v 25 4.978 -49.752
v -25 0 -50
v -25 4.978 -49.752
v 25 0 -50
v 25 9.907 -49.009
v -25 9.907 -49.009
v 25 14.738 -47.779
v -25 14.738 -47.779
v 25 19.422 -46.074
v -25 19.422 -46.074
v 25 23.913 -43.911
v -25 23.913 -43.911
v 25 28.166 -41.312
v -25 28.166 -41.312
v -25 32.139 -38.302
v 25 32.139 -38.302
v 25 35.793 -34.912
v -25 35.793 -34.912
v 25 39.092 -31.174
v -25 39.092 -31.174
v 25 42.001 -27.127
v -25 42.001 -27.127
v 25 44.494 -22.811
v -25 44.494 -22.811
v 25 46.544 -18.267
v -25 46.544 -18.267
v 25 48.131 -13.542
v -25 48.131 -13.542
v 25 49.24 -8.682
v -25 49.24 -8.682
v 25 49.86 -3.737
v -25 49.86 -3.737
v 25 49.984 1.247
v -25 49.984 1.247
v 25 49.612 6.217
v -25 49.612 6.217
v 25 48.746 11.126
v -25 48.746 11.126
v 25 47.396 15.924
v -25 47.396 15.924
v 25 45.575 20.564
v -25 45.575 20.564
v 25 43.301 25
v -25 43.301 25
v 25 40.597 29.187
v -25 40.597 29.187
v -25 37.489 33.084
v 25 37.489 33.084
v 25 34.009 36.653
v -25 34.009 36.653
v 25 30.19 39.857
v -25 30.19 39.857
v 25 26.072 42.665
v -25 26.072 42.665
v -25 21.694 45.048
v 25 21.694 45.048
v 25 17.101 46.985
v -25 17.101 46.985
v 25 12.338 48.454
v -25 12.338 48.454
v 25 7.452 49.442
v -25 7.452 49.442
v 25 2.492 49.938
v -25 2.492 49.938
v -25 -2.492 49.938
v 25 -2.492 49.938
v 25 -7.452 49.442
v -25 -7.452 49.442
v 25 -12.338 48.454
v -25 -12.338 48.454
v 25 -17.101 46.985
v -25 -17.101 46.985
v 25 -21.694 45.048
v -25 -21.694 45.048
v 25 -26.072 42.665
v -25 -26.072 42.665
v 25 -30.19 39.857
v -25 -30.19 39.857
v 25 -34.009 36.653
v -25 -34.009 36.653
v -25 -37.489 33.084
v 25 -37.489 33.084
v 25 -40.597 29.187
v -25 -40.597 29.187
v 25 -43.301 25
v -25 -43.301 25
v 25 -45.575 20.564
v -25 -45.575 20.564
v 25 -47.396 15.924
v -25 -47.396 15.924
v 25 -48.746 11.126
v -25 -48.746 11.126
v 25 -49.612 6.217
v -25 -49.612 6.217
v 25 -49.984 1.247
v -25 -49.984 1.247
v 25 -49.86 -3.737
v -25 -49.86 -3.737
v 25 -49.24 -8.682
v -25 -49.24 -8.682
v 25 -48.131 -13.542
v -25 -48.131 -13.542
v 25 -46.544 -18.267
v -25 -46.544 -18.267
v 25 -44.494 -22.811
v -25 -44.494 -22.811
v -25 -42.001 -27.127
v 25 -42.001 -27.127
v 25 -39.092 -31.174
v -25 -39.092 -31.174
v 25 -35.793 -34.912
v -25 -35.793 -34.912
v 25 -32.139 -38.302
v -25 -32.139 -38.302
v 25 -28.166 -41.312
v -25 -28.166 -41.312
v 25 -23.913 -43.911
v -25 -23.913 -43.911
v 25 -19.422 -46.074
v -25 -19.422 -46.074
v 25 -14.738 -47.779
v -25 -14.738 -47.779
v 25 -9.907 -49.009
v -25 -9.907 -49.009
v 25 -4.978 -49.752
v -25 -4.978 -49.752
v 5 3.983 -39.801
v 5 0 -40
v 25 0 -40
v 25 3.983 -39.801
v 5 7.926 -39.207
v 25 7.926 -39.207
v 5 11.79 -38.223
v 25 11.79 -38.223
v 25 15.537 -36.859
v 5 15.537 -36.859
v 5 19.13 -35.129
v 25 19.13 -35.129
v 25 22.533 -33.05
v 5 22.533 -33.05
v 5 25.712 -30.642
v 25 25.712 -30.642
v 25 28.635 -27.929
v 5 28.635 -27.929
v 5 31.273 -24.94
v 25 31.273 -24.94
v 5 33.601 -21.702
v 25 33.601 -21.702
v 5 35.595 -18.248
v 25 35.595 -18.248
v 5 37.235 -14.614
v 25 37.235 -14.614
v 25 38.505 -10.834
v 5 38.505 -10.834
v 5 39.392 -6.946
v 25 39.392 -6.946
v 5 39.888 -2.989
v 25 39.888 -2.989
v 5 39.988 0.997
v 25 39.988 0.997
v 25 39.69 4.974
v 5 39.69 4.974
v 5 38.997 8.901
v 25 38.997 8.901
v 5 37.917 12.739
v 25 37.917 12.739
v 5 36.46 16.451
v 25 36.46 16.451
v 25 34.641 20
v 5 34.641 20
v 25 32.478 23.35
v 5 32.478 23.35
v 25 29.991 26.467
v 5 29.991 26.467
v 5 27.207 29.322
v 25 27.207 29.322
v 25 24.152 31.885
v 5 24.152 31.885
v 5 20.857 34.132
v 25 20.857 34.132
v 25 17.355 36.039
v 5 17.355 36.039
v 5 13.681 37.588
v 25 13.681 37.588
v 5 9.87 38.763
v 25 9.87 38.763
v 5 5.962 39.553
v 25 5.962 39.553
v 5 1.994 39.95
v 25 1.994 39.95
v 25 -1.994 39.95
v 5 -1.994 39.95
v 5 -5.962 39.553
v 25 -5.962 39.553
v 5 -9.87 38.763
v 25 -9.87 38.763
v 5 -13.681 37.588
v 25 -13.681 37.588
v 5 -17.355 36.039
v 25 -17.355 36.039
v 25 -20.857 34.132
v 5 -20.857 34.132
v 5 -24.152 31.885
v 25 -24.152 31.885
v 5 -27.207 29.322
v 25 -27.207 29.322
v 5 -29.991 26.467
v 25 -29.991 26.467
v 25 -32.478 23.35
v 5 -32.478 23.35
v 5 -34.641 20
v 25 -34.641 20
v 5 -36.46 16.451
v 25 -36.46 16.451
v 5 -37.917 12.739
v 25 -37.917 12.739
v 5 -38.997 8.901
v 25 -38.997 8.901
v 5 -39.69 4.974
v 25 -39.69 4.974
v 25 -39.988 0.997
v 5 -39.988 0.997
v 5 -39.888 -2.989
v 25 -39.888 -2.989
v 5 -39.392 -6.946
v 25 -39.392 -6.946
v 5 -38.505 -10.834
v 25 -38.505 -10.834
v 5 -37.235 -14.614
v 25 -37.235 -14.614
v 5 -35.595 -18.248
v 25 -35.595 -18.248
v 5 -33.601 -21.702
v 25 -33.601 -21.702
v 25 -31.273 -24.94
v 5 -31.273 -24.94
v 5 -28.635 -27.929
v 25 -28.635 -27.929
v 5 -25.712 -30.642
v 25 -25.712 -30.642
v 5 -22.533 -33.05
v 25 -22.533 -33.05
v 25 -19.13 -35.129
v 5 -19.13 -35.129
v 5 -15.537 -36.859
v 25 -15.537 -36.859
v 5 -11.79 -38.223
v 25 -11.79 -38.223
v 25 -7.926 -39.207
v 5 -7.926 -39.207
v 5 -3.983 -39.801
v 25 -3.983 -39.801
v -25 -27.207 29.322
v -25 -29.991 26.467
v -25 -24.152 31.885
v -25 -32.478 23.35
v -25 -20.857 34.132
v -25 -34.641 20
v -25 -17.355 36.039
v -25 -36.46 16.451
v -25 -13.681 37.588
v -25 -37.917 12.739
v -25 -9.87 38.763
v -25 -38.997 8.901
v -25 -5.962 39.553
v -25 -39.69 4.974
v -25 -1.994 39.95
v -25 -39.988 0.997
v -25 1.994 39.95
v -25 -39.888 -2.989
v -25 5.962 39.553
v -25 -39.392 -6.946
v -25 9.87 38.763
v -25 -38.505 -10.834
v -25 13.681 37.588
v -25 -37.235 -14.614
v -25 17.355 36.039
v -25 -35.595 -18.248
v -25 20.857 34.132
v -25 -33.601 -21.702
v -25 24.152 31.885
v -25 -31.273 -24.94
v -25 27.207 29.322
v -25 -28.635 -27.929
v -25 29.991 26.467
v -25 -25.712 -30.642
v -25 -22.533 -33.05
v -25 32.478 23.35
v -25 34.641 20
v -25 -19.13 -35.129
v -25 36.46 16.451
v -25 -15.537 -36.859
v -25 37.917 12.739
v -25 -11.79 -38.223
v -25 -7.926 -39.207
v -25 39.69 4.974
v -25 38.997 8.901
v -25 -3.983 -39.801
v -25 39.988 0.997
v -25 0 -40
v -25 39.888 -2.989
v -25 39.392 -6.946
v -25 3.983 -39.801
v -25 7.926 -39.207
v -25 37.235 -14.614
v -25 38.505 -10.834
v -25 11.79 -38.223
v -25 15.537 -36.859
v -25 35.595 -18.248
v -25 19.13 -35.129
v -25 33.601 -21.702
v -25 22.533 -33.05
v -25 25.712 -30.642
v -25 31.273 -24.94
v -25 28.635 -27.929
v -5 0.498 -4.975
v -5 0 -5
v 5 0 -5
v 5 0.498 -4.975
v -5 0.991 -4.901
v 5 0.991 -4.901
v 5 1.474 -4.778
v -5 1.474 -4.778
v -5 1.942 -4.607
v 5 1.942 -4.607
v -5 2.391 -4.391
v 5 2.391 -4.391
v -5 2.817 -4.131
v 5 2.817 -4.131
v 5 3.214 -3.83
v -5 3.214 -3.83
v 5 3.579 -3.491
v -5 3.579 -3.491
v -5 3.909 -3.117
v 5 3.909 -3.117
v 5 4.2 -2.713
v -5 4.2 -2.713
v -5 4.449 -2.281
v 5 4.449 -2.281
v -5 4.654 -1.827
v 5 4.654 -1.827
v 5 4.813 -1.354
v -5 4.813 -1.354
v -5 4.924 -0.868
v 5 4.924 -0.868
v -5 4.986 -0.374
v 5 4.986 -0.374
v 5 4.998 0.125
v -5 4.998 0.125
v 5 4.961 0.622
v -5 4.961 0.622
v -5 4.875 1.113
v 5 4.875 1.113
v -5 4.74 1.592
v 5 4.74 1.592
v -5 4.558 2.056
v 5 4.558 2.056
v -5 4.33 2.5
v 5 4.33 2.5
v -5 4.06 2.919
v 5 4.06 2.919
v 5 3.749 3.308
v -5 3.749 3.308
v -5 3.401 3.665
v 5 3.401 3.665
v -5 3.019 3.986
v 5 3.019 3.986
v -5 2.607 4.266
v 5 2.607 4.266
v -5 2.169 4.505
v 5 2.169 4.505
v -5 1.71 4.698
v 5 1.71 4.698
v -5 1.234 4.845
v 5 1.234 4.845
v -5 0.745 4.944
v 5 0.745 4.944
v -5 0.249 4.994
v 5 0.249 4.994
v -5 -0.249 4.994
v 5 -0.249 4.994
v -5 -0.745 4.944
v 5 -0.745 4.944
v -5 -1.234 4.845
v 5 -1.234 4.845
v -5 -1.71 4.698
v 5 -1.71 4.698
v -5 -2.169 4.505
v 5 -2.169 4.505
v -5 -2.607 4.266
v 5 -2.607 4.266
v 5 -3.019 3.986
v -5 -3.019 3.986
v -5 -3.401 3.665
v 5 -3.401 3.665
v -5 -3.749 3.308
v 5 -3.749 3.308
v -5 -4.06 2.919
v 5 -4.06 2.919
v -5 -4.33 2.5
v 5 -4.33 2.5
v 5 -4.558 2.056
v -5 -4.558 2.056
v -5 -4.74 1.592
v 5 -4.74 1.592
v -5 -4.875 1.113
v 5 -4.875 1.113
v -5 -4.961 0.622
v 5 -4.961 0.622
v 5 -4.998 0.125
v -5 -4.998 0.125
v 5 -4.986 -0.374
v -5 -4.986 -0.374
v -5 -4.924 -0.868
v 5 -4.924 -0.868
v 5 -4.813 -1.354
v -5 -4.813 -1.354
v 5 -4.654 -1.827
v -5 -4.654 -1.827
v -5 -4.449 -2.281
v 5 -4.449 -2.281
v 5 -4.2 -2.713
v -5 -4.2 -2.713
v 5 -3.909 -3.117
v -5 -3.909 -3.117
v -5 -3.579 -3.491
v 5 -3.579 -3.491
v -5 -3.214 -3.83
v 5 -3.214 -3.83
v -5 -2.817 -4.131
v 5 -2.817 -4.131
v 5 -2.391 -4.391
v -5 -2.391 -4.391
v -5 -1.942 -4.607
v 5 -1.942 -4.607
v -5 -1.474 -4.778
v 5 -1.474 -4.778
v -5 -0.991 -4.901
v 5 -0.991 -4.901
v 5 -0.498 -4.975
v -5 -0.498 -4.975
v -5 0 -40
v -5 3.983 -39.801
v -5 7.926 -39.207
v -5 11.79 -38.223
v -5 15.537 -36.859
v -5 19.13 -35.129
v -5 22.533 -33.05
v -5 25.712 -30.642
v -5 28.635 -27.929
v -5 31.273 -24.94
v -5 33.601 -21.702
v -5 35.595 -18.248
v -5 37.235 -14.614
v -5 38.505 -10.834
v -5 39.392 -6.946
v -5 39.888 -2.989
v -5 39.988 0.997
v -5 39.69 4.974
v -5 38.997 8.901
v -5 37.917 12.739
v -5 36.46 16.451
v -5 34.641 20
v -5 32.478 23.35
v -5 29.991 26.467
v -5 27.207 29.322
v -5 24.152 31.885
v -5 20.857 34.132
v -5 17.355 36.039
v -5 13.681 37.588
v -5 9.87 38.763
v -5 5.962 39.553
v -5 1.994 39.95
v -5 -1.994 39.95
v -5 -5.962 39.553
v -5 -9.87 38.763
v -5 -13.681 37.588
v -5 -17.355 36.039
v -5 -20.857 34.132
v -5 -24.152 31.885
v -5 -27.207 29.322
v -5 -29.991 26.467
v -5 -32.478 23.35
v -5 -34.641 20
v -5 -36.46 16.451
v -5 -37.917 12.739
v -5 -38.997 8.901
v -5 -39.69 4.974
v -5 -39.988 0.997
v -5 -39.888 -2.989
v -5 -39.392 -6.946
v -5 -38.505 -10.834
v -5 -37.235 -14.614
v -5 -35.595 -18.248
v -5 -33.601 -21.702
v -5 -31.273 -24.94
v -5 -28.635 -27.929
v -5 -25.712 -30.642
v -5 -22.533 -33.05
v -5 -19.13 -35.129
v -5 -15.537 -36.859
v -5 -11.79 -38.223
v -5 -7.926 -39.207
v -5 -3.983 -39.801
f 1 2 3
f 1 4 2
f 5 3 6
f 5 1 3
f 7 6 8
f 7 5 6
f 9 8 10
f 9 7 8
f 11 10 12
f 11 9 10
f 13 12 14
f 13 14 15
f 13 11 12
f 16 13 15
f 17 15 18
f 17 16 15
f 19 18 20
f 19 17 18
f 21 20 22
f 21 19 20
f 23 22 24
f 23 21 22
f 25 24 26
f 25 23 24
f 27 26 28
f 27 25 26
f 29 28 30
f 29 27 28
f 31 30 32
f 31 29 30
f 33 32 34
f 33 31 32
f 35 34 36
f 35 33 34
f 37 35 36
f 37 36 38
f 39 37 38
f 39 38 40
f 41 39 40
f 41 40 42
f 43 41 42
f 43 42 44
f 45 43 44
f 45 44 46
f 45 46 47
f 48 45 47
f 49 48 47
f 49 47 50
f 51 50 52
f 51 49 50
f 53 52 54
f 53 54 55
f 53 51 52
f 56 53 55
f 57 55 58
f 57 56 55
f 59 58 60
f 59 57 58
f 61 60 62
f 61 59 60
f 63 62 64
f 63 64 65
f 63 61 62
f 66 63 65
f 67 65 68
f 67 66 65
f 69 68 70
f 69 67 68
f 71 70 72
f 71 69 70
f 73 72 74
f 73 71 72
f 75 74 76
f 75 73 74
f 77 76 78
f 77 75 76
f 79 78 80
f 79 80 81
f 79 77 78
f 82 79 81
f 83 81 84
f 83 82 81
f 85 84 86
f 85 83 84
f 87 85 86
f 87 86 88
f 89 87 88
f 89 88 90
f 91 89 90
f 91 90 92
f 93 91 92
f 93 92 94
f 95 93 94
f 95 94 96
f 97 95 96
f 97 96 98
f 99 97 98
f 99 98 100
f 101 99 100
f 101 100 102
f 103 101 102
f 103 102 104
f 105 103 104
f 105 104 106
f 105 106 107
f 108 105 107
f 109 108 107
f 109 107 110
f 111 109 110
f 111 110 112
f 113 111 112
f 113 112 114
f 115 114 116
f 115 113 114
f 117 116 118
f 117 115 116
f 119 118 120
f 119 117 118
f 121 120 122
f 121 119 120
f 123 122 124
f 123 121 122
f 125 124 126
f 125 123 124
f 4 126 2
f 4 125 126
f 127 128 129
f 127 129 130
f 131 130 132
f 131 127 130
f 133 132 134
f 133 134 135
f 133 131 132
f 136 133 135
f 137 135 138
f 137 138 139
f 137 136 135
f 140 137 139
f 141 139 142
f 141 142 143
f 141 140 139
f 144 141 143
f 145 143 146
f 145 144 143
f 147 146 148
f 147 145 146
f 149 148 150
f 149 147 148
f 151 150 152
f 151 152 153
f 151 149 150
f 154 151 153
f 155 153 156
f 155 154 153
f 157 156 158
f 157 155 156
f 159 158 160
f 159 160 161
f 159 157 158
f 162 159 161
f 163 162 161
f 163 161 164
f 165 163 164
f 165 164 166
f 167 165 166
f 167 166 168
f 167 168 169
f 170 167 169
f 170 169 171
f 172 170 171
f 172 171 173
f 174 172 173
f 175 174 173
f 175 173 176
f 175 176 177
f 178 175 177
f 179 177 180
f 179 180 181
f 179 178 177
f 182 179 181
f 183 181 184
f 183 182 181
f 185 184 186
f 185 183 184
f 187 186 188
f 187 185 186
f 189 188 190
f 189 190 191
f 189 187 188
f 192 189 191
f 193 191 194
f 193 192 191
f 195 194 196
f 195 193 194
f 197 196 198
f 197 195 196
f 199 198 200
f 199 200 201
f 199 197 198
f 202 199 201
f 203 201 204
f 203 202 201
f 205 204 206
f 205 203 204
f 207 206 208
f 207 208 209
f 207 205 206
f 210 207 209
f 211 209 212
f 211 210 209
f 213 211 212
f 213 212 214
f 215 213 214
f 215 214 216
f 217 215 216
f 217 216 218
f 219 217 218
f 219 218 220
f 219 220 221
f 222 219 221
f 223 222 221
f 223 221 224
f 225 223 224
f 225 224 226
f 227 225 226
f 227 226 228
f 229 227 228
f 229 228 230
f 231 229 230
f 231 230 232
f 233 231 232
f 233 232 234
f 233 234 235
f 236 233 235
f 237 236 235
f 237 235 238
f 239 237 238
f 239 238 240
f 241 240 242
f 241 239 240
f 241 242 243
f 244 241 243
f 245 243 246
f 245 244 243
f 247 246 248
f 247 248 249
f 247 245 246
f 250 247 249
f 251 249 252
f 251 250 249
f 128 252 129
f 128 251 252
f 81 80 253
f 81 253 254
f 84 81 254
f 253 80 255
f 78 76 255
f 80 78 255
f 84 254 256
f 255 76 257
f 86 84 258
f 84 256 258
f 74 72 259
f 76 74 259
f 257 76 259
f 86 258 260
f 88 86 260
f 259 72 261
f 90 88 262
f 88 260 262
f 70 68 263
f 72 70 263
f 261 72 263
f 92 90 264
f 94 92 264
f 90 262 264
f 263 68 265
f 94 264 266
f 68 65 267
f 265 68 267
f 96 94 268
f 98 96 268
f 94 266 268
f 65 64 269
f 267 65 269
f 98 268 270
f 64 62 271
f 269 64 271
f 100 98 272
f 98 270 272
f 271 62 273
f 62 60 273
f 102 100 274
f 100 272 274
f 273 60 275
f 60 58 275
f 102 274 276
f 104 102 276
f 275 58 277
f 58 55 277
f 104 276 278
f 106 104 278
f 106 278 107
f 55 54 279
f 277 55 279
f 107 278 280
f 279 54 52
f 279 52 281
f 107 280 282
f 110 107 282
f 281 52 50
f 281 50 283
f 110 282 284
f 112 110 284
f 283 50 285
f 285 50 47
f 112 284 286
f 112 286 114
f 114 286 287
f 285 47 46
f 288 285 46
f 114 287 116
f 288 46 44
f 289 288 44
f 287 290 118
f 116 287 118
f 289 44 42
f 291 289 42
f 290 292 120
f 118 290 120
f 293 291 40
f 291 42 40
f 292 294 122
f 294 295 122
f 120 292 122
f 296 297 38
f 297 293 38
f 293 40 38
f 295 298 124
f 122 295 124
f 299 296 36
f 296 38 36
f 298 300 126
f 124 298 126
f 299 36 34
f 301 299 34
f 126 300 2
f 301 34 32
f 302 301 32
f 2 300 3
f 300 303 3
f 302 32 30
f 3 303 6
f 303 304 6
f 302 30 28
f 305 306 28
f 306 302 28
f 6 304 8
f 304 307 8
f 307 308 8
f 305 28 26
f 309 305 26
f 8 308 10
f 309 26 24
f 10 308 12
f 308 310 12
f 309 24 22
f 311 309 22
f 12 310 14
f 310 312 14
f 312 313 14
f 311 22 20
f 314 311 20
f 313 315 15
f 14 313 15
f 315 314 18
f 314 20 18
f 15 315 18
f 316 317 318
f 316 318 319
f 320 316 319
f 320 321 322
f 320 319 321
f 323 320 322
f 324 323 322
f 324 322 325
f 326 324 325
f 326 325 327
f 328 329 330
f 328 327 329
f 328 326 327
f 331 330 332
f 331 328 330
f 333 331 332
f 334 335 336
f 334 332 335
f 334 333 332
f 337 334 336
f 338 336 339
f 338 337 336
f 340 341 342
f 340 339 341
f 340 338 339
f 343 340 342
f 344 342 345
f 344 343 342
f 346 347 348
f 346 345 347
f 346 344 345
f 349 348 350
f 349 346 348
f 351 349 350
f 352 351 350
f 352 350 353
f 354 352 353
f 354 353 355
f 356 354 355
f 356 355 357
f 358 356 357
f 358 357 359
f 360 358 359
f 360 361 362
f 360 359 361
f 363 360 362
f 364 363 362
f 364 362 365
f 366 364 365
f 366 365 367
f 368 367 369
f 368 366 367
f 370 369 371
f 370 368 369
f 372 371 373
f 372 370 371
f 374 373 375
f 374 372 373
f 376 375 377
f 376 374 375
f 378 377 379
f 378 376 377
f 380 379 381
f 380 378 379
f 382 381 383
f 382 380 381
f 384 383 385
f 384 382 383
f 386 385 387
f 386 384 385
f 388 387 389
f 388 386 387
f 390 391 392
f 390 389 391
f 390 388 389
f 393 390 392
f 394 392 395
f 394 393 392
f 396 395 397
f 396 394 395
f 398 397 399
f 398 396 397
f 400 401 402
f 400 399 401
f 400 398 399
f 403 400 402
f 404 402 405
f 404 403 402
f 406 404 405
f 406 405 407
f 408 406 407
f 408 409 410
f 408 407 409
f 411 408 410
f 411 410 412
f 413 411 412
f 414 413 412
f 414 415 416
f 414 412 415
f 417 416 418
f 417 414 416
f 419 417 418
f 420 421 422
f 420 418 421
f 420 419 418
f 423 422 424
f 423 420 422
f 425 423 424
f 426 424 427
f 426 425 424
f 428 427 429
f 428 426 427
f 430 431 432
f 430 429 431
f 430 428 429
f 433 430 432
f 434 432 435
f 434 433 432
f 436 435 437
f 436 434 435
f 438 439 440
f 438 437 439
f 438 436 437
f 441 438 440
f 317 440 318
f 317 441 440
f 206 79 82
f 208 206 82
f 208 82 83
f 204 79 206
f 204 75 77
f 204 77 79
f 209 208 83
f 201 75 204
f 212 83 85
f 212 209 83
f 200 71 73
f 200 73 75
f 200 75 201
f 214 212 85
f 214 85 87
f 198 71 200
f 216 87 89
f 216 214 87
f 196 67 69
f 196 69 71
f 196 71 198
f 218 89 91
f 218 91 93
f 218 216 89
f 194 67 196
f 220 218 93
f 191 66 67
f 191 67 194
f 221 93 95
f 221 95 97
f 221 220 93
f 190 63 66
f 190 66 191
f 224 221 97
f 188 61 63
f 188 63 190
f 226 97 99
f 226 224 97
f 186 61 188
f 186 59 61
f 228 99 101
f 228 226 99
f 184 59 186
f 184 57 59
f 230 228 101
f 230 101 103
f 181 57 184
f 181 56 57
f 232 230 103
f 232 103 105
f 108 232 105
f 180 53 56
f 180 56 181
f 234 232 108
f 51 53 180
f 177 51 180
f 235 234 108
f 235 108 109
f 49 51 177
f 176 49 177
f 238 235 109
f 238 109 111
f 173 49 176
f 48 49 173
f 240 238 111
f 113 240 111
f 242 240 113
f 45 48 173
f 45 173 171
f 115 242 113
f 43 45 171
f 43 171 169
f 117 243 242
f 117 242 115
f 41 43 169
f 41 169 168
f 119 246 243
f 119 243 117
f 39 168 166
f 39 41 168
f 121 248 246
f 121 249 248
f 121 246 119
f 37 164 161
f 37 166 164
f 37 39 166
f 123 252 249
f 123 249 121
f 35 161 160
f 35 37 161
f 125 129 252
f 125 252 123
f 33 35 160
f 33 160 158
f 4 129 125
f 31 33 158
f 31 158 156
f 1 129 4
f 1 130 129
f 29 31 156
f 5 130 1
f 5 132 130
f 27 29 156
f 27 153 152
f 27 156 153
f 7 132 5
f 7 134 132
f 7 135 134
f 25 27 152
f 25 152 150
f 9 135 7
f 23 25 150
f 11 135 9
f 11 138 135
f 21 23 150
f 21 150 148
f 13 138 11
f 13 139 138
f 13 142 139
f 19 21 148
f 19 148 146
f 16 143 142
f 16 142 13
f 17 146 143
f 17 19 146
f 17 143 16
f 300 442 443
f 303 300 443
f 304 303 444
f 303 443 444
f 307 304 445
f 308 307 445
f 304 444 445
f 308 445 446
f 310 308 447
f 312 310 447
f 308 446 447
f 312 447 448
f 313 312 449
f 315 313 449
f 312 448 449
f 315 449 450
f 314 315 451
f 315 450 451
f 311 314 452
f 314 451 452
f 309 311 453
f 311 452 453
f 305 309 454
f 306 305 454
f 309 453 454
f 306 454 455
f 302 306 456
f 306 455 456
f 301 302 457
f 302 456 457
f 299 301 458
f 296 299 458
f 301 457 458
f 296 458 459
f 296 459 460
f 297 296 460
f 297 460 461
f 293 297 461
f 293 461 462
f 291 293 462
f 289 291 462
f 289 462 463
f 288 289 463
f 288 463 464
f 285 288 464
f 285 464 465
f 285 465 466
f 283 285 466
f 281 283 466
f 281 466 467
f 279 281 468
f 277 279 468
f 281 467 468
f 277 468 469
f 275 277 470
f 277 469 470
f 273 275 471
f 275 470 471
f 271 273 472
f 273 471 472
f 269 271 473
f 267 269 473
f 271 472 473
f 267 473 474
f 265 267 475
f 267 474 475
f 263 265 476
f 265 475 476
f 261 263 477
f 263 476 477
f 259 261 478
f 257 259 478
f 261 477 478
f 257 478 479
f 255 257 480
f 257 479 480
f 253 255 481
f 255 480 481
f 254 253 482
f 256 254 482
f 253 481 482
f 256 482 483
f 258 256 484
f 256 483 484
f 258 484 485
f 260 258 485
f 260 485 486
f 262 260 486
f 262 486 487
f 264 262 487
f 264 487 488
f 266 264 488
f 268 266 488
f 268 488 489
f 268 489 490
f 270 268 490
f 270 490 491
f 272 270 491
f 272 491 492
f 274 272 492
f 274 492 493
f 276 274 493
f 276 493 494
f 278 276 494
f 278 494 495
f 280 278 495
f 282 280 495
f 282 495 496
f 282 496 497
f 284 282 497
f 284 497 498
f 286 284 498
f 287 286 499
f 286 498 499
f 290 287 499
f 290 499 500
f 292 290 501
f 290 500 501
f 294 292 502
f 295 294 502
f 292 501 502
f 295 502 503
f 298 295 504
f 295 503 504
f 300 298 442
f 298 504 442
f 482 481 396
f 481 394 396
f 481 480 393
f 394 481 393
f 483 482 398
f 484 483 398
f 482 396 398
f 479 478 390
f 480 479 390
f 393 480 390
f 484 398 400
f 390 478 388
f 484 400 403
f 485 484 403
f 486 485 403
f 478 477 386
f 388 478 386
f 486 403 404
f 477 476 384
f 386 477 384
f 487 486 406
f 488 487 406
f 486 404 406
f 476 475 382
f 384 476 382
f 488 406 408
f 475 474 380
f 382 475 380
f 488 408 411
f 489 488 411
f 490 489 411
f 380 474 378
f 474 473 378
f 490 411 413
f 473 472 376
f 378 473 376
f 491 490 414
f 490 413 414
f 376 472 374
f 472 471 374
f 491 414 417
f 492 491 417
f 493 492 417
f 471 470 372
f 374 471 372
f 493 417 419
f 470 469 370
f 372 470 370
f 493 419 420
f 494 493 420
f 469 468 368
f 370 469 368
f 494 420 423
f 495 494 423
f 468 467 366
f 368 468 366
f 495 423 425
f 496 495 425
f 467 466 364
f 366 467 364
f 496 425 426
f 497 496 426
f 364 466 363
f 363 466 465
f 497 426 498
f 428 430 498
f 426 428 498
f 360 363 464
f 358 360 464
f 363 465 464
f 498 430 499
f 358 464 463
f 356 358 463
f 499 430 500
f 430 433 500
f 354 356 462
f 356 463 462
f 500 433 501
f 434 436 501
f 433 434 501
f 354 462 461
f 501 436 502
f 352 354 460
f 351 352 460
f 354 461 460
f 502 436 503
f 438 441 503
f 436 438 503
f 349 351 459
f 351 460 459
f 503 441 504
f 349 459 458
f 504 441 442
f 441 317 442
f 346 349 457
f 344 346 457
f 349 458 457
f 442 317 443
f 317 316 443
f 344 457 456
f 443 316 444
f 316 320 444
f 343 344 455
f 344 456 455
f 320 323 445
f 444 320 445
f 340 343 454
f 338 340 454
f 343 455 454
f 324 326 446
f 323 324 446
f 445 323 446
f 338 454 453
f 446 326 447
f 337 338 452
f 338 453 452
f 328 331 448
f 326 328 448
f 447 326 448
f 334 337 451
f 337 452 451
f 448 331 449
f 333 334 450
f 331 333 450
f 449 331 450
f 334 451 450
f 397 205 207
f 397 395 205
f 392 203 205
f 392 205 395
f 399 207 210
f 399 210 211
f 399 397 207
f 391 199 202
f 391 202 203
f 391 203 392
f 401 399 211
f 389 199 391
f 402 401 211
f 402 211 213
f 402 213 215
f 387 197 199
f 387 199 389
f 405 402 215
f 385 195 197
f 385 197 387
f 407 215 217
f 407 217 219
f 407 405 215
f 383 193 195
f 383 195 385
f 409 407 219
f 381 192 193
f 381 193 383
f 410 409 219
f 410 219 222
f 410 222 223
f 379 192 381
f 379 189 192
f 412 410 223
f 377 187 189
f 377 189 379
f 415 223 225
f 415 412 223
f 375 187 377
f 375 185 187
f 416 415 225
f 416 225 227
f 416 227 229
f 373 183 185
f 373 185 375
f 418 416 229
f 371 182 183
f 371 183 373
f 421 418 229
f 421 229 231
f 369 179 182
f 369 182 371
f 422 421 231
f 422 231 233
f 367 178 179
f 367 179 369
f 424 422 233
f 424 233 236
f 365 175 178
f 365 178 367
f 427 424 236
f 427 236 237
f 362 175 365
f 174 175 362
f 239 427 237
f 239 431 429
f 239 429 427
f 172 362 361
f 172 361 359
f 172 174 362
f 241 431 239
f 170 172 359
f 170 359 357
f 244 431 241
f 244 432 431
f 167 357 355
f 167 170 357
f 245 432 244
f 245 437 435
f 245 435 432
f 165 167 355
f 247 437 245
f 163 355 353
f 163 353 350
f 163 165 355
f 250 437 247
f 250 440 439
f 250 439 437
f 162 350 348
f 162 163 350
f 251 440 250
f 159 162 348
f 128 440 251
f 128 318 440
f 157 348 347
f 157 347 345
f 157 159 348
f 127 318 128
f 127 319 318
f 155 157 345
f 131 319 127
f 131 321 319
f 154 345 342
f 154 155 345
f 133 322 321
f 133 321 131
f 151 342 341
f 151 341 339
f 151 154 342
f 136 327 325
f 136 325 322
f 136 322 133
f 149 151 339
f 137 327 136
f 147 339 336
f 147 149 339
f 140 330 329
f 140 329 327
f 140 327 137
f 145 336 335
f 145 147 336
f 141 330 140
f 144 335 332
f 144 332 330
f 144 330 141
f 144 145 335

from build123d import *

# Parameters (mm, degrees)
SKETCH1_R           = 50
SKETCH1_R_2         = 5
BOSS_EXTRUDE1_DEPTH = 25
CUT_EXTRUDE1_START  = -5
SKETCH3_R           = 40
CUT_EXTRUDE1_DEPTH  = 20
CUT_EXTRUDE2_START  = 25
SKETCH3_2_R         = 40
CUT_EXTRUDE2_DEPTH  = 20


with BuildPart() as part:
    # Sketch1 → Boss-Extrude1 (new, symmetric)
    with BuildSketch(Plane(origin=(0, 0, 0), x_dir=(0, 0, -1), z_dir=(1, 0, 0))):
        Circle(SKETCH1_R)
        Circle(SKETCH1_R_2, mode=Mode.SUBTRACT)
    extrude(amount=BOSS_EXTRUDE1_DEPTH, both=True)

    # Sketch3 → Cut-Extrude1 (cut)
    with BuildSketch(Plane(origin=(0, 0, 0), x_dir=(0, 0, -1), z_dir=(1, 0, 0)).offset(CUT_EXTRUDE1_START)):
        Circle(SKETCH3_R)
    extrude(amount=-CUT_EXTRUDE1_DEPTH, mode=Mode.SUBTRACT)

    # Sketch3<2> → Cut-Extrude2 (cut)
    with BuildSketch(Plane(origin=(0, 0, 0), x_dir=(0, 0, -1), z_dir=(1, 0, 0)).offset(CUT_EXTRUDE2_START)):
        Circle(SKETCH3_2_R)
    extrude(amount=-CUT_EXTRUDE2_DEPTH, mode=Mode.SUBTRACT)


solid = part.part
